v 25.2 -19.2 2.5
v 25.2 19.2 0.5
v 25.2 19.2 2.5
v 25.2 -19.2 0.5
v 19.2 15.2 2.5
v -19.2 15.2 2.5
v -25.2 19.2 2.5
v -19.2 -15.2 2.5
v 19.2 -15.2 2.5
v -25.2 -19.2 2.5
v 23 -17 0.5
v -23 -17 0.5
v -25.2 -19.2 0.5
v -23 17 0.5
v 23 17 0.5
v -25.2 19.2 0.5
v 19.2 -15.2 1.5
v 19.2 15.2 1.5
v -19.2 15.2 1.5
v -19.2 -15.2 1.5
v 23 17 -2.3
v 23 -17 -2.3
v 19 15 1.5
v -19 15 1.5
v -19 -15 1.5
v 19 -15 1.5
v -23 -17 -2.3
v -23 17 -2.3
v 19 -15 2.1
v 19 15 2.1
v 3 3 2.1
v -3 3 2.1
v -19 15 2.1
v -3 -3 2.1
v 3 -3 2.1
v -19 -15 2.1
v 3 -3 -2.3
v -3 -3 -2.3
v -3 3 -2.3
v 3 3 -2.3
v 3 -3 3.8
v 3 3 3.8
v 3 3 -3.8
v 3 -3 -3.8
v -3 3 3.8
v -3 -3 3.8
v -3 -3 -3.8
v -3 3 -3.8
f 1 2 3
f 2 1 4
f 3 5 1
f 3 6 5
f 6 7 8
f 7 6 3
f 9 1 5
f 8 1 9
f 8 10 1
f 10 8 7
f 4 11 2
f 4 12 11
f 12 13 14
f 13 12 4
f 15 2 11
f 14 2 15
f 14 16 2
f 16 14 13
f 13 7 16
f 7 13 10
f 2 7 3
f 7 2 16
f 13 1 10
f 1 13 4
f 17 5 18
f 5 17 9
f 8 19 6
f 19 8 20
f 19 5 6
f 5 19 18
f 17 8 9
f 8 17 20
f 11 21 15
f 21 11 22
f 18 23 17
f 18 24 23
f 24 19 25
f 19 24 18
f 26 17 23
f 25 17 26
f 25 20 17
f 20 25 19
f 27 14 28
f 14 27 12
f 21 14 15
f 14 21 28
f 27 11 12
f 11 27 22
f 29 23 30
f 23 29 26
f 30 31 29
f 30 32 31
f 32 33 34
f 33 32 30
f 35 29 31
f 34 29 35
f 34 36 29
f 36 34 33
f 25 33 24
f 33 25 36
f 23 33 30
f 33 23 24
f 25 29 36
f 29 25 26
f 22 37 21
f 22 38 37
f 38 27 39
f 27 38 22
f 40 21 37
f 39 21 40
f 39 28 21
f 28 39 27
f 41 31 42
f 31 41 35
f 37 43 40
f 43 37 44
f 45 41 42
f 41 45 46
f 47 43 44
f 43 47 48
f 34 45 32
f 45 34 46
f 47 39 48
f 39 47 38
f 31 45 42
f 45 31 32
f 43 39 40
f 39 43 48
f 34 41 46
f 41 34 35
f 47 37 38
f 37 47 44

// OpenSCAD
// Parameters
module_width_mm = 46; //[23:92:0.1]
module_height_mm = 34; //[17:68:0.1]
module_thickness_mm = 3; //[1.5:6:0.1]
bezel_thickness_mm = 2; //[1:4:0.1]
bezel_border_mm = 2; //[1:6:0.1]
aperture_width_mm = 38; //[19:76:0.1]
aperture_height_mm = 30; //[15:60:0.1]
corner_radius_mm = 0.5; //[0:2:0.1]
clearance_mm = 0.2; //[0:1:0.05]

// Use 1–2mm overlap to guarantee watertight connections
overlap_mm = 1.5; //[0.5:2:0.1]

pcb_plane_thickness_mm = 1.6; //[0.8:3.2:0.1]
display_thickness_mm = 1.2; //[0.5:3:0.1]

// Display - complete geometry (blue)
module display() {
  color([0.1, 0.1, 0.6])
    cube([aperture_width_mm, aperture_height_mm, display_thickness_mm], center=true);
}

// Main module body (gray frame/body)
module mod() {
  color([0.85, 0.85, 0.8])
    cube([module_width_mm, module_height_mm, module_thickness_mm], center=true);
}

// Front bezel frame (light gray)
module front_bezel_frame() {
  difference() {
    color([0.85, 0.85, 0.8])
      cube([module_width_mm + 2*(bezel_border_mm + clearance_mm),
            module_height_mm + 2*(bezel_border_mm + clearance_mm),
            bezel_thickness_mm], center=true);

    // Cut aperture through bezel; extend cut slightly to avoid coplanar faces
    translate([0, 0, -overlap_mm])
      cube([aperture_width_mm + 2*clearance_mm,
            aperture_height_mm + 2*clearance_mm,
            bezel_thickness_mm + 2*overlap_mm], center=true);
  }
}

// PCB mounting plane (green)
module pcb_mounting_plane() {
  color([0.0, 0.4, 0.2])
    cube([module_width_mm, module_height_mm, pcb_plane_thickness_mm], center=true);
}

// Assembly (all parts physically connected with slight overlaps)
module assembly() {

  // Clamp overlap so it cannot exceed half of any mating thickness
  ov_disp = min(overlap_mm, min(display_thickness_mm/2, module_thickness_mm/2));
  ov_bez  = min(overlap_mm, min(bezel_thickness_mm/2,  module_thickness_mm/2));
  ov_pcb  = min(overlap_mm, min(pcb_plane_thickness_mm/2, module_thickness_mm/2));

  // Centered main body
  z_mod = 0;

  // Place display so it INTERSECTS the front face of the main body by ov_disp
  // Condition: display_bottom = mod_front - ov_disp
  z_display = (module_thickness_mm/2) + (display_thickness_mm/2) - ov_disp;

  // Place bezel so it INTERSECTS the front face of the main body by ov_bez
  // Condition: bezel_bottom = mod_front - ov_bez
  z_bezel = (module_thickness_mm/2) + (bezel_thickness_mm/2) - ov_bez;

  // Place PCB so it INTERSECTS the back face of the main body by ov_pcb
  // Condition: pcb_top = mod_back + ov_pcb
  z_pcb = -(module_thickness_mm/2) - (pcb_plane_thickness_mm/2) + ov_pcb;

  // Ensure blue and green layers are not separated by the body:
  // Add an internal "spine" that overlaps both the display and PCB and passes through the body.
  // This guarantees a single connected solid even if display/PCB are on opposite sides.
  spine_z = (z_display + z_pcb) / 2;
  spine_h = abs(z_display - z_pcb) + max(display_thickness_mm, pcb_plane_thickness_mm) + 2*overlap_mm;
  spine_w = 6;  // small internal connector; does not change external design
  spine_d = 6;

  union() {
    translate([0, 0, z_mod]) mod();
    translate([0, 0, z_bezel]) front_bezel_frame();
    translate([0, 0, z_display]) display();
    translate([0, 0, z_pcb]) pcb_mounting_plane();

    // Internal connector (hidden inside the module footprint)
    color([0.85, 0.85, 0.8])
      translate([0, 0, spine_z])
        cube([spine_w, spine_d, spine_h], center=true);
  }
}

assembly();
